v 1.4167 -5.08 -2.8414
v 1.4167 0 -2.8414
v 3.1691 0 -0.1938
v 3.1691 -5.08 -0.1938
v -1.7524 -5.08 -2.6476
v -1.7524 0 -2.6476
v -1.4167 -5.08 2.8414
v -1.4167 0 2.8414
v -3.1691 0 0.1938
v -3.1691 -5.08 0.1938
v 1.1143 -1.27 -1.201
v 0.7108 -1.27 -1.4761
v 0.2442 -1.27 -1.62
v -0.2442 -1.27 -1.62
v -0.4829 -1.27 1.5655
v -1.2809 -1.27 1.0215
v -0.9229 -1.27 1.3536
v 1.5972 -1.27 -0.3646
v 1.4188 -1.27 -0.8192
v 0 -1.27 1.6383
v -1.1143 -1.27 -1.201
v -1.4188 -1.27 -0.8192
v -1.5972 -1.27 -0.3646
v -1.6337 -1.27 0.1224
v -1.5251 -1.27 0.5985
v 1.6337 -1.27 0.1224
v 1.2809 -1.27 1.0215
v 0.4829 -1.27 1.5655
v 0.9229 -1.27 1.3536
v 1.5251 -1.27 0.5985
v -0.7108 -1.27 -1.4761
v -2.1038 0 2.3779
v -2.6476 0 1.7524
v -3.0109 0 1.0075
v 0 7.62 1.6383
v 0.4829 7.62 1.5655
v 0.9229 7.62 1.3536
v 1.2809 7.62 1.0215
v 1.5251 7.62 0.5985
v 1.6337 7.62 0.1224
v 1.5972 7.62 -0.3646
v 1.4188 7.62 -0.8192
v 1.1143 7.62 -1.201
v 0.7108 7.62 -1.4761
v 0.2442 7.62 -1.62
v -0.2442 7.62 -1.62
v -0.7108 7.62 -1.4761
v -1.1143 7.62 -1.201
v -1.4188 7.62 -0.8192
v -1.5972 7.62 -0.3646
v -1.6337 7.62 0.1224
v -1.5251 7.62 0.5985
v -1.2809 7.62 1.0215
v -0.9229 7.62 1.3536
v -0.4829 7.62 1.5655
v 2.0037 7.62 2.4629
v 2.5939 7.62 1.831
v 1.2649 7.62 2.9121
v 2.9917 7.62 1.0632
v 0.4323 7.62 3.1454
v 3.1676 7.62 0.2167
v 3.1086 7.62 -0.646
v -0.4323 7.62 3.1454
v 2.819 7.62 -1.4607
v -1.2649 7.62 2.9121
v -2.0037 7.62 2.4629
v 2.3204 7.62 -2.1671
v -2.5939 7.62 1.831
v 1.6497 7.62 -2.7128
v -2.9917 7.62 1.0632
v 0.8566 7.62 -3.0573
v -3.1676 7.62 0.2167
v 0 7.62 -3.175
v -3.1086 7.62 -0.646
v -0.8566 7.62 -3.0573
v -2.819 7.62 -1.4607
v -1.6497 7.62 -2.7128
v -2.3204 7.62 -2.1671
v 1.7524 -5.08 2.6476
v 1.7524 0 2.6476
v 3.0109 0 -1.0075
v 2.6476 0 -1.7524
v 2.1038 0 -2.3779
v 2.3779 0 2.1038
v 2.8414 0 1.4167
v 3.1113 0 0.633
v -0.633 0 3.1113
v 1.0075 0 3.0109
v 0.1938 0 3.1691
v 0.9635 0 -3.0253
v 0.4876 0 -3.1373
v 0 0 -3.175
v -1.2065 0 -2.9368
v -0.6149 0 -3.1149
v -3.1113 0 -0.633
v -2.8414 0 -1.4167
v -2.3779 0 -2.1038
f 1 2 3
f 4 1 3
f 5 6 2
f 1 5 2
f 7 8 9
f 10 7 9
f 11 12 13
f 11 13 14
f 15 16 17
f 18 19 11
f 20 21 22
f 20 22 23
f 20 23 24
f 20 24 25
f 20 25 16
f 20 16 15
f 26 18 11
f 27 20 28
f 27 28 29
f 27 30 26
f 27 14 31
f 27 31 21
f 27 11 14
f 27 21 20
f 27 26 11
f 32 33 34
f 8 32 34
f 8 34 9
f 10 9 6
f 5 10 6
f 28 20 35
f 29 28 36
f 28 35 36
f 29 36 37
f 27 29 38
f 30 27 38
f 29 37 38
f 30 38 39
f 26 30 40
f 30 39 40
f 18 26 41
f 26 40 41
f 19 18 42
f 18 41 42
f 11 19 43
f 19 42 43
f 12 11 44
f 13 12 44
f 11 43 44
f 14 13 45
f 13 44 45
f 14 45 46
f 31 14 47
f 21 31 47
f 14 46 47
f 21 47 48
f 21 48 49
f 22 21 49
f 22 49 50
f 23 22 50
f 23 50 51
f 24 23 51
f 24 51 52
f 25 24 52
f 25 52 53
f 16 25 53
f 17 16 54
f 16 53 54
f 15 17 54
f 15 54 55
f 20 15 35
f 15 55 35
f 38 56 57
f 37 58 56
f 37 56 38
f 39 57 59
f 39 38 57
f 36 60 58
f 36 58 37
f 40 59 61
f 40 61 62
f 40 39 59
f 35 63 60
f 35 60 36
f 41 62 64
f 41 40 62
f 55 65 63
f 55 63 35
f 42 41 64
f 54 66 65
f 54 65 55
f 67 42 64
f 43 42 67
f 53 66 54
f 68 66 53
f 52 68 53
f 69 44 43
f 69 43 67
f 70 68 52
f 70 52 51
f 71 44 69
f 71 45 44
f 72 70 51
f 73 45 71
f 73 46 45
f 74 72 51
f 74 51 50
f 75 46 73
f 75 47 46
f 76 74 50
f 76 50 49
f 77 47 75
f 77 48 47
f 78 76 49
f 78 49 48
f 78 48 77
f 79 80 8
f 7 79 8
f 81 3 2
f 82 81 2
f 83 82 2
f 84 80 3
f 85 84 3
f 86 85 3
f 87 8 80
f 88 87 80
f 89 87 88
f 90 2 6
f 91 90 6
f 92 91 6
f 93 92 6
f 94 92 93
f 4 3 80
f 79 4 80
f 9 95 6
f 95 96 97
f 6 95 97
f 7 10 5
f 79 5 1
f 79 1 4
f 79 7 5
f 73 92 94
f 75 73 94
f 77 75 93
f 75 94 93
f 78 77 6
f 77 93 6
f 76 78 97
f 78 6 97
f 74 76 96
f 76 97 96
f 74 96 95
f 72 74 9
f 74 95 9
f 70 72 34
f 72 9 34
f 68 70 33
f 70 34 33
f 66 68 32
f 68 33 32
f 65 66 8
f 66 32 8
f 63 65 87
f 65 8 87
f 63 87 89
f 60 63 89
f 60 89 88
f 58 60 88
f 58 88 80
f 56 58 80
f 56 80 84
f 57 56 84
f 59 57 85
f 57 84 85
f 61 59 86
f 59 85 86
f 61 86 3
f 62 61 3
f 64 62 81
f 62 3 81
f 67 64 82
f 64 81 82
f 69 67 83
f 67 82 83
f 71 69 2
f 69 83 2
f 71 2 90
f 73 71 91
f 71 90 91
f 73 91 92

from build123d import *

# Parameters (mm, degrees)
SKETCH1_R           = 3.175
BOSS_EXTRUDE1_DEPTH = 7.62
BOSS_EXTRUDE2_DEPTH = 5.08
SKETCH4_R           = 1.6383
CUT_EXTRUDE1_DEPTH  = 8.89


with BuildPart() as part:
    # Sketch1 → Boss-Extrude1 (new body)
    with BuildSketch(Plane(origin=(0, 0, 0), x_dir=(1, 0, 0), z_dir=(0, 1, 0))):
        with Locations(Location((0, 0, 0), (0, 0, 90))):
            Circle(SKETCH1_R)
    extrude(amount=BOSS_EXTRUDE1_DEPTH)

    # Sketch3 → Boss-Extrude2 (add)
    with BuildSketch(Plane.XZ):
        Polygon((-1.416669754, 2.841420738), (-3.169077419, 0.193838373), (-1.752407664, -2.647582365), (1.416669754, -2.841420738), (3.169077419, -0.193838373), (1.752407664, 2.647582365), align=None)
    extrude(amount=BOSS_EXTRUDE2_DEPTH)

    # Sketch4 → Cut-Extrude1 (cut)
    with BuildSketch(Plane(origin=(0, 7.62, 0), x_dir=(1, 0, 0), z_dir=(0, 1, 0))):
        with Locations(Location((0, 0, 0), (0, 0, 270))):
            Circle(SKETCH4_R)
    extrude(amount=-CUT_EXTRUDE1_DEPTH, mode=Mode.SUBTRACT)


solid = part.part
